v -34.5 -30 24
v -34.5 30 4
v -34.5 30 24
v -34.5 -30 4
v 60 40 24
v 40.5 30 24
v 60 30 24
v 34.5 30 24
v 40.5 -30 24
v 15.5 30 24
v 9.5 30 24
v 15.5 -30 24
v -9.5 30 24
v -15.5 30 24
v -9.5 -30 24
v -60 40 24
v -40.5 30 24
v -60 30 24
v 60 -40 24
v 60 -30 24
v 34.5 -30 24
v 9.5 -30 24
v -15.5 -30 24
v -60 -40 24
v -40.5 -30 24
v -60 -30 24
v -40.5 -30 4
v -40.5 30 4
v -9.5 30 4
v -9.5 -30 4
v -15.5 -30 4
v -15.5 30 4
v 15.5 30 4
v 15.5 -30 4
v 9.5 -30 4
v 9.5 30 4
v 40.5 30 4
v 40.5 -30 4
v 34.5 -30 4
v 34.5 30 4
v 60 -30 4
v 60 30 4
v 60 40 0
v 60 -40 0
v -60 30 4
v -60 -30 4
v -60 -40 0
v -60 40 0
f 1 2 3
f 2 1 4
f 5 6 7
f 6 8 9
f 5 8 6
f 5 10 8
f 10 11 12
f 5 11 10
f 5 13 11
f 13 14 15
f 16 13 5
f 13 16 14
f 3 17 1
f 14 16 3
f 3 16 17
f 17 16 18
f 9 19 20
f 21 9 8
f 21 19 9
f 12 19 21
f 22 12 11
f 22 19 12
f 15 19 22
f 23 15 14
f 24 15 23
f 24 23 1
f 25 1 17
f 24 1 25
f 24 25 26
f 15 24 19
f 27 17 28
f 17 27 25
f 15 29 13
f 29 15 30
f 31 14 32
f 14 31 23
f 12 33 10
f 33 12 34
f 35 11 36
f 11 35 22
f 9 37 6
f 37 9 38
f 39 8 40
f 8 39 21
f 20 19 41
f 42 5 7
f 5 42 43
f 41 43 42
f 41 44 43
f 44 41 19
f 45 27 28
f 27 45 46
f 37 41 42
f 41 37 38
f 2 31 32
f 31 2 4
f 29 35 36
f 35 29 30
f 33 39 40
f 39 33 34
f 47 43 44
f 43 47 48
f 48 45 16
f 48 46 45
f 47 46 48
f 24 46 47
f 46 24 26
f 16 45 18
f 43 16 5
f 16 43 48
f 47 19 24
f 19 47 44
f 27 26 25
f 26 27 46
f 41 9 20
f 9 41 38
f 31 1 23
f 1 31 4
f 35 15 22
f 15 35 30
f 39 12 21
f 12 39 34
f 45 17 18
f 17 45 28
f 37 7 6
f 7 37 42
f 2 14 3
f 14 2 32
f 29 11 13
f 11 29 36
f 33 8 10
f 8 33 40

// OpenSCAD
$fn = 32;

// ----------------------------------------------------------------------
// Rib frame 120 x 80 x 24
// 4 ribs at 25 mm pitch
// ----------------------------------------------------------------------

// --- parameters (mm) ---
frame = [120, 80, 4];  // base plate size (x, y, z)
rail_w = 10;           // side rail width
ribs = 4;              // number of ribs
rib_t = 6;             // rib thickness
rib_h = 20;            // rib height above the base plate
pitch = 25;            // pitch between rib centres

// --- derived feature positions (mm) ---
span = (ribs - 1) * pitch;          // = 75   distance between the outer ribs
origin_x = -span / 2;               // = -37.5   X of the first rib
rib_len = frame[1] - 2 * rail_w + 2;  // = 62   rib length, 1 mm into each rail
feature_centers = [
  [origin_x + 0 * pitch, 0],
  [origin_x + 1 * pitch, 0],
  [origin_x + 2 * pitch, 0],
  [origin_x + 3 * pitch, 0]
];   // rib centre line, drives the rib loop

// base plate, two side rails, then the ribs read straight off feature_centers
union() {
  translate([-frame[0] / 2, -frame[1] / 2, 0]) cube(frame);
  translate([-frame[0] / 2, -frame[1] / 2, 0]) cube([frame[0], rail_w, frame[2] + rib_h]);
  translate([-frame[0] / 2, frame[1] / 2 - rail_w, 0]) cube([frame[0], rail_w, frame[2] + rib_h]);
  for (centre = feature_centers)
    translate([centre[0] - rib_t / 2, centre[1] - rib_len / 2, frame[2] - 1])
      cube([rib_t, rib_len, rib_h + 1]);
}
